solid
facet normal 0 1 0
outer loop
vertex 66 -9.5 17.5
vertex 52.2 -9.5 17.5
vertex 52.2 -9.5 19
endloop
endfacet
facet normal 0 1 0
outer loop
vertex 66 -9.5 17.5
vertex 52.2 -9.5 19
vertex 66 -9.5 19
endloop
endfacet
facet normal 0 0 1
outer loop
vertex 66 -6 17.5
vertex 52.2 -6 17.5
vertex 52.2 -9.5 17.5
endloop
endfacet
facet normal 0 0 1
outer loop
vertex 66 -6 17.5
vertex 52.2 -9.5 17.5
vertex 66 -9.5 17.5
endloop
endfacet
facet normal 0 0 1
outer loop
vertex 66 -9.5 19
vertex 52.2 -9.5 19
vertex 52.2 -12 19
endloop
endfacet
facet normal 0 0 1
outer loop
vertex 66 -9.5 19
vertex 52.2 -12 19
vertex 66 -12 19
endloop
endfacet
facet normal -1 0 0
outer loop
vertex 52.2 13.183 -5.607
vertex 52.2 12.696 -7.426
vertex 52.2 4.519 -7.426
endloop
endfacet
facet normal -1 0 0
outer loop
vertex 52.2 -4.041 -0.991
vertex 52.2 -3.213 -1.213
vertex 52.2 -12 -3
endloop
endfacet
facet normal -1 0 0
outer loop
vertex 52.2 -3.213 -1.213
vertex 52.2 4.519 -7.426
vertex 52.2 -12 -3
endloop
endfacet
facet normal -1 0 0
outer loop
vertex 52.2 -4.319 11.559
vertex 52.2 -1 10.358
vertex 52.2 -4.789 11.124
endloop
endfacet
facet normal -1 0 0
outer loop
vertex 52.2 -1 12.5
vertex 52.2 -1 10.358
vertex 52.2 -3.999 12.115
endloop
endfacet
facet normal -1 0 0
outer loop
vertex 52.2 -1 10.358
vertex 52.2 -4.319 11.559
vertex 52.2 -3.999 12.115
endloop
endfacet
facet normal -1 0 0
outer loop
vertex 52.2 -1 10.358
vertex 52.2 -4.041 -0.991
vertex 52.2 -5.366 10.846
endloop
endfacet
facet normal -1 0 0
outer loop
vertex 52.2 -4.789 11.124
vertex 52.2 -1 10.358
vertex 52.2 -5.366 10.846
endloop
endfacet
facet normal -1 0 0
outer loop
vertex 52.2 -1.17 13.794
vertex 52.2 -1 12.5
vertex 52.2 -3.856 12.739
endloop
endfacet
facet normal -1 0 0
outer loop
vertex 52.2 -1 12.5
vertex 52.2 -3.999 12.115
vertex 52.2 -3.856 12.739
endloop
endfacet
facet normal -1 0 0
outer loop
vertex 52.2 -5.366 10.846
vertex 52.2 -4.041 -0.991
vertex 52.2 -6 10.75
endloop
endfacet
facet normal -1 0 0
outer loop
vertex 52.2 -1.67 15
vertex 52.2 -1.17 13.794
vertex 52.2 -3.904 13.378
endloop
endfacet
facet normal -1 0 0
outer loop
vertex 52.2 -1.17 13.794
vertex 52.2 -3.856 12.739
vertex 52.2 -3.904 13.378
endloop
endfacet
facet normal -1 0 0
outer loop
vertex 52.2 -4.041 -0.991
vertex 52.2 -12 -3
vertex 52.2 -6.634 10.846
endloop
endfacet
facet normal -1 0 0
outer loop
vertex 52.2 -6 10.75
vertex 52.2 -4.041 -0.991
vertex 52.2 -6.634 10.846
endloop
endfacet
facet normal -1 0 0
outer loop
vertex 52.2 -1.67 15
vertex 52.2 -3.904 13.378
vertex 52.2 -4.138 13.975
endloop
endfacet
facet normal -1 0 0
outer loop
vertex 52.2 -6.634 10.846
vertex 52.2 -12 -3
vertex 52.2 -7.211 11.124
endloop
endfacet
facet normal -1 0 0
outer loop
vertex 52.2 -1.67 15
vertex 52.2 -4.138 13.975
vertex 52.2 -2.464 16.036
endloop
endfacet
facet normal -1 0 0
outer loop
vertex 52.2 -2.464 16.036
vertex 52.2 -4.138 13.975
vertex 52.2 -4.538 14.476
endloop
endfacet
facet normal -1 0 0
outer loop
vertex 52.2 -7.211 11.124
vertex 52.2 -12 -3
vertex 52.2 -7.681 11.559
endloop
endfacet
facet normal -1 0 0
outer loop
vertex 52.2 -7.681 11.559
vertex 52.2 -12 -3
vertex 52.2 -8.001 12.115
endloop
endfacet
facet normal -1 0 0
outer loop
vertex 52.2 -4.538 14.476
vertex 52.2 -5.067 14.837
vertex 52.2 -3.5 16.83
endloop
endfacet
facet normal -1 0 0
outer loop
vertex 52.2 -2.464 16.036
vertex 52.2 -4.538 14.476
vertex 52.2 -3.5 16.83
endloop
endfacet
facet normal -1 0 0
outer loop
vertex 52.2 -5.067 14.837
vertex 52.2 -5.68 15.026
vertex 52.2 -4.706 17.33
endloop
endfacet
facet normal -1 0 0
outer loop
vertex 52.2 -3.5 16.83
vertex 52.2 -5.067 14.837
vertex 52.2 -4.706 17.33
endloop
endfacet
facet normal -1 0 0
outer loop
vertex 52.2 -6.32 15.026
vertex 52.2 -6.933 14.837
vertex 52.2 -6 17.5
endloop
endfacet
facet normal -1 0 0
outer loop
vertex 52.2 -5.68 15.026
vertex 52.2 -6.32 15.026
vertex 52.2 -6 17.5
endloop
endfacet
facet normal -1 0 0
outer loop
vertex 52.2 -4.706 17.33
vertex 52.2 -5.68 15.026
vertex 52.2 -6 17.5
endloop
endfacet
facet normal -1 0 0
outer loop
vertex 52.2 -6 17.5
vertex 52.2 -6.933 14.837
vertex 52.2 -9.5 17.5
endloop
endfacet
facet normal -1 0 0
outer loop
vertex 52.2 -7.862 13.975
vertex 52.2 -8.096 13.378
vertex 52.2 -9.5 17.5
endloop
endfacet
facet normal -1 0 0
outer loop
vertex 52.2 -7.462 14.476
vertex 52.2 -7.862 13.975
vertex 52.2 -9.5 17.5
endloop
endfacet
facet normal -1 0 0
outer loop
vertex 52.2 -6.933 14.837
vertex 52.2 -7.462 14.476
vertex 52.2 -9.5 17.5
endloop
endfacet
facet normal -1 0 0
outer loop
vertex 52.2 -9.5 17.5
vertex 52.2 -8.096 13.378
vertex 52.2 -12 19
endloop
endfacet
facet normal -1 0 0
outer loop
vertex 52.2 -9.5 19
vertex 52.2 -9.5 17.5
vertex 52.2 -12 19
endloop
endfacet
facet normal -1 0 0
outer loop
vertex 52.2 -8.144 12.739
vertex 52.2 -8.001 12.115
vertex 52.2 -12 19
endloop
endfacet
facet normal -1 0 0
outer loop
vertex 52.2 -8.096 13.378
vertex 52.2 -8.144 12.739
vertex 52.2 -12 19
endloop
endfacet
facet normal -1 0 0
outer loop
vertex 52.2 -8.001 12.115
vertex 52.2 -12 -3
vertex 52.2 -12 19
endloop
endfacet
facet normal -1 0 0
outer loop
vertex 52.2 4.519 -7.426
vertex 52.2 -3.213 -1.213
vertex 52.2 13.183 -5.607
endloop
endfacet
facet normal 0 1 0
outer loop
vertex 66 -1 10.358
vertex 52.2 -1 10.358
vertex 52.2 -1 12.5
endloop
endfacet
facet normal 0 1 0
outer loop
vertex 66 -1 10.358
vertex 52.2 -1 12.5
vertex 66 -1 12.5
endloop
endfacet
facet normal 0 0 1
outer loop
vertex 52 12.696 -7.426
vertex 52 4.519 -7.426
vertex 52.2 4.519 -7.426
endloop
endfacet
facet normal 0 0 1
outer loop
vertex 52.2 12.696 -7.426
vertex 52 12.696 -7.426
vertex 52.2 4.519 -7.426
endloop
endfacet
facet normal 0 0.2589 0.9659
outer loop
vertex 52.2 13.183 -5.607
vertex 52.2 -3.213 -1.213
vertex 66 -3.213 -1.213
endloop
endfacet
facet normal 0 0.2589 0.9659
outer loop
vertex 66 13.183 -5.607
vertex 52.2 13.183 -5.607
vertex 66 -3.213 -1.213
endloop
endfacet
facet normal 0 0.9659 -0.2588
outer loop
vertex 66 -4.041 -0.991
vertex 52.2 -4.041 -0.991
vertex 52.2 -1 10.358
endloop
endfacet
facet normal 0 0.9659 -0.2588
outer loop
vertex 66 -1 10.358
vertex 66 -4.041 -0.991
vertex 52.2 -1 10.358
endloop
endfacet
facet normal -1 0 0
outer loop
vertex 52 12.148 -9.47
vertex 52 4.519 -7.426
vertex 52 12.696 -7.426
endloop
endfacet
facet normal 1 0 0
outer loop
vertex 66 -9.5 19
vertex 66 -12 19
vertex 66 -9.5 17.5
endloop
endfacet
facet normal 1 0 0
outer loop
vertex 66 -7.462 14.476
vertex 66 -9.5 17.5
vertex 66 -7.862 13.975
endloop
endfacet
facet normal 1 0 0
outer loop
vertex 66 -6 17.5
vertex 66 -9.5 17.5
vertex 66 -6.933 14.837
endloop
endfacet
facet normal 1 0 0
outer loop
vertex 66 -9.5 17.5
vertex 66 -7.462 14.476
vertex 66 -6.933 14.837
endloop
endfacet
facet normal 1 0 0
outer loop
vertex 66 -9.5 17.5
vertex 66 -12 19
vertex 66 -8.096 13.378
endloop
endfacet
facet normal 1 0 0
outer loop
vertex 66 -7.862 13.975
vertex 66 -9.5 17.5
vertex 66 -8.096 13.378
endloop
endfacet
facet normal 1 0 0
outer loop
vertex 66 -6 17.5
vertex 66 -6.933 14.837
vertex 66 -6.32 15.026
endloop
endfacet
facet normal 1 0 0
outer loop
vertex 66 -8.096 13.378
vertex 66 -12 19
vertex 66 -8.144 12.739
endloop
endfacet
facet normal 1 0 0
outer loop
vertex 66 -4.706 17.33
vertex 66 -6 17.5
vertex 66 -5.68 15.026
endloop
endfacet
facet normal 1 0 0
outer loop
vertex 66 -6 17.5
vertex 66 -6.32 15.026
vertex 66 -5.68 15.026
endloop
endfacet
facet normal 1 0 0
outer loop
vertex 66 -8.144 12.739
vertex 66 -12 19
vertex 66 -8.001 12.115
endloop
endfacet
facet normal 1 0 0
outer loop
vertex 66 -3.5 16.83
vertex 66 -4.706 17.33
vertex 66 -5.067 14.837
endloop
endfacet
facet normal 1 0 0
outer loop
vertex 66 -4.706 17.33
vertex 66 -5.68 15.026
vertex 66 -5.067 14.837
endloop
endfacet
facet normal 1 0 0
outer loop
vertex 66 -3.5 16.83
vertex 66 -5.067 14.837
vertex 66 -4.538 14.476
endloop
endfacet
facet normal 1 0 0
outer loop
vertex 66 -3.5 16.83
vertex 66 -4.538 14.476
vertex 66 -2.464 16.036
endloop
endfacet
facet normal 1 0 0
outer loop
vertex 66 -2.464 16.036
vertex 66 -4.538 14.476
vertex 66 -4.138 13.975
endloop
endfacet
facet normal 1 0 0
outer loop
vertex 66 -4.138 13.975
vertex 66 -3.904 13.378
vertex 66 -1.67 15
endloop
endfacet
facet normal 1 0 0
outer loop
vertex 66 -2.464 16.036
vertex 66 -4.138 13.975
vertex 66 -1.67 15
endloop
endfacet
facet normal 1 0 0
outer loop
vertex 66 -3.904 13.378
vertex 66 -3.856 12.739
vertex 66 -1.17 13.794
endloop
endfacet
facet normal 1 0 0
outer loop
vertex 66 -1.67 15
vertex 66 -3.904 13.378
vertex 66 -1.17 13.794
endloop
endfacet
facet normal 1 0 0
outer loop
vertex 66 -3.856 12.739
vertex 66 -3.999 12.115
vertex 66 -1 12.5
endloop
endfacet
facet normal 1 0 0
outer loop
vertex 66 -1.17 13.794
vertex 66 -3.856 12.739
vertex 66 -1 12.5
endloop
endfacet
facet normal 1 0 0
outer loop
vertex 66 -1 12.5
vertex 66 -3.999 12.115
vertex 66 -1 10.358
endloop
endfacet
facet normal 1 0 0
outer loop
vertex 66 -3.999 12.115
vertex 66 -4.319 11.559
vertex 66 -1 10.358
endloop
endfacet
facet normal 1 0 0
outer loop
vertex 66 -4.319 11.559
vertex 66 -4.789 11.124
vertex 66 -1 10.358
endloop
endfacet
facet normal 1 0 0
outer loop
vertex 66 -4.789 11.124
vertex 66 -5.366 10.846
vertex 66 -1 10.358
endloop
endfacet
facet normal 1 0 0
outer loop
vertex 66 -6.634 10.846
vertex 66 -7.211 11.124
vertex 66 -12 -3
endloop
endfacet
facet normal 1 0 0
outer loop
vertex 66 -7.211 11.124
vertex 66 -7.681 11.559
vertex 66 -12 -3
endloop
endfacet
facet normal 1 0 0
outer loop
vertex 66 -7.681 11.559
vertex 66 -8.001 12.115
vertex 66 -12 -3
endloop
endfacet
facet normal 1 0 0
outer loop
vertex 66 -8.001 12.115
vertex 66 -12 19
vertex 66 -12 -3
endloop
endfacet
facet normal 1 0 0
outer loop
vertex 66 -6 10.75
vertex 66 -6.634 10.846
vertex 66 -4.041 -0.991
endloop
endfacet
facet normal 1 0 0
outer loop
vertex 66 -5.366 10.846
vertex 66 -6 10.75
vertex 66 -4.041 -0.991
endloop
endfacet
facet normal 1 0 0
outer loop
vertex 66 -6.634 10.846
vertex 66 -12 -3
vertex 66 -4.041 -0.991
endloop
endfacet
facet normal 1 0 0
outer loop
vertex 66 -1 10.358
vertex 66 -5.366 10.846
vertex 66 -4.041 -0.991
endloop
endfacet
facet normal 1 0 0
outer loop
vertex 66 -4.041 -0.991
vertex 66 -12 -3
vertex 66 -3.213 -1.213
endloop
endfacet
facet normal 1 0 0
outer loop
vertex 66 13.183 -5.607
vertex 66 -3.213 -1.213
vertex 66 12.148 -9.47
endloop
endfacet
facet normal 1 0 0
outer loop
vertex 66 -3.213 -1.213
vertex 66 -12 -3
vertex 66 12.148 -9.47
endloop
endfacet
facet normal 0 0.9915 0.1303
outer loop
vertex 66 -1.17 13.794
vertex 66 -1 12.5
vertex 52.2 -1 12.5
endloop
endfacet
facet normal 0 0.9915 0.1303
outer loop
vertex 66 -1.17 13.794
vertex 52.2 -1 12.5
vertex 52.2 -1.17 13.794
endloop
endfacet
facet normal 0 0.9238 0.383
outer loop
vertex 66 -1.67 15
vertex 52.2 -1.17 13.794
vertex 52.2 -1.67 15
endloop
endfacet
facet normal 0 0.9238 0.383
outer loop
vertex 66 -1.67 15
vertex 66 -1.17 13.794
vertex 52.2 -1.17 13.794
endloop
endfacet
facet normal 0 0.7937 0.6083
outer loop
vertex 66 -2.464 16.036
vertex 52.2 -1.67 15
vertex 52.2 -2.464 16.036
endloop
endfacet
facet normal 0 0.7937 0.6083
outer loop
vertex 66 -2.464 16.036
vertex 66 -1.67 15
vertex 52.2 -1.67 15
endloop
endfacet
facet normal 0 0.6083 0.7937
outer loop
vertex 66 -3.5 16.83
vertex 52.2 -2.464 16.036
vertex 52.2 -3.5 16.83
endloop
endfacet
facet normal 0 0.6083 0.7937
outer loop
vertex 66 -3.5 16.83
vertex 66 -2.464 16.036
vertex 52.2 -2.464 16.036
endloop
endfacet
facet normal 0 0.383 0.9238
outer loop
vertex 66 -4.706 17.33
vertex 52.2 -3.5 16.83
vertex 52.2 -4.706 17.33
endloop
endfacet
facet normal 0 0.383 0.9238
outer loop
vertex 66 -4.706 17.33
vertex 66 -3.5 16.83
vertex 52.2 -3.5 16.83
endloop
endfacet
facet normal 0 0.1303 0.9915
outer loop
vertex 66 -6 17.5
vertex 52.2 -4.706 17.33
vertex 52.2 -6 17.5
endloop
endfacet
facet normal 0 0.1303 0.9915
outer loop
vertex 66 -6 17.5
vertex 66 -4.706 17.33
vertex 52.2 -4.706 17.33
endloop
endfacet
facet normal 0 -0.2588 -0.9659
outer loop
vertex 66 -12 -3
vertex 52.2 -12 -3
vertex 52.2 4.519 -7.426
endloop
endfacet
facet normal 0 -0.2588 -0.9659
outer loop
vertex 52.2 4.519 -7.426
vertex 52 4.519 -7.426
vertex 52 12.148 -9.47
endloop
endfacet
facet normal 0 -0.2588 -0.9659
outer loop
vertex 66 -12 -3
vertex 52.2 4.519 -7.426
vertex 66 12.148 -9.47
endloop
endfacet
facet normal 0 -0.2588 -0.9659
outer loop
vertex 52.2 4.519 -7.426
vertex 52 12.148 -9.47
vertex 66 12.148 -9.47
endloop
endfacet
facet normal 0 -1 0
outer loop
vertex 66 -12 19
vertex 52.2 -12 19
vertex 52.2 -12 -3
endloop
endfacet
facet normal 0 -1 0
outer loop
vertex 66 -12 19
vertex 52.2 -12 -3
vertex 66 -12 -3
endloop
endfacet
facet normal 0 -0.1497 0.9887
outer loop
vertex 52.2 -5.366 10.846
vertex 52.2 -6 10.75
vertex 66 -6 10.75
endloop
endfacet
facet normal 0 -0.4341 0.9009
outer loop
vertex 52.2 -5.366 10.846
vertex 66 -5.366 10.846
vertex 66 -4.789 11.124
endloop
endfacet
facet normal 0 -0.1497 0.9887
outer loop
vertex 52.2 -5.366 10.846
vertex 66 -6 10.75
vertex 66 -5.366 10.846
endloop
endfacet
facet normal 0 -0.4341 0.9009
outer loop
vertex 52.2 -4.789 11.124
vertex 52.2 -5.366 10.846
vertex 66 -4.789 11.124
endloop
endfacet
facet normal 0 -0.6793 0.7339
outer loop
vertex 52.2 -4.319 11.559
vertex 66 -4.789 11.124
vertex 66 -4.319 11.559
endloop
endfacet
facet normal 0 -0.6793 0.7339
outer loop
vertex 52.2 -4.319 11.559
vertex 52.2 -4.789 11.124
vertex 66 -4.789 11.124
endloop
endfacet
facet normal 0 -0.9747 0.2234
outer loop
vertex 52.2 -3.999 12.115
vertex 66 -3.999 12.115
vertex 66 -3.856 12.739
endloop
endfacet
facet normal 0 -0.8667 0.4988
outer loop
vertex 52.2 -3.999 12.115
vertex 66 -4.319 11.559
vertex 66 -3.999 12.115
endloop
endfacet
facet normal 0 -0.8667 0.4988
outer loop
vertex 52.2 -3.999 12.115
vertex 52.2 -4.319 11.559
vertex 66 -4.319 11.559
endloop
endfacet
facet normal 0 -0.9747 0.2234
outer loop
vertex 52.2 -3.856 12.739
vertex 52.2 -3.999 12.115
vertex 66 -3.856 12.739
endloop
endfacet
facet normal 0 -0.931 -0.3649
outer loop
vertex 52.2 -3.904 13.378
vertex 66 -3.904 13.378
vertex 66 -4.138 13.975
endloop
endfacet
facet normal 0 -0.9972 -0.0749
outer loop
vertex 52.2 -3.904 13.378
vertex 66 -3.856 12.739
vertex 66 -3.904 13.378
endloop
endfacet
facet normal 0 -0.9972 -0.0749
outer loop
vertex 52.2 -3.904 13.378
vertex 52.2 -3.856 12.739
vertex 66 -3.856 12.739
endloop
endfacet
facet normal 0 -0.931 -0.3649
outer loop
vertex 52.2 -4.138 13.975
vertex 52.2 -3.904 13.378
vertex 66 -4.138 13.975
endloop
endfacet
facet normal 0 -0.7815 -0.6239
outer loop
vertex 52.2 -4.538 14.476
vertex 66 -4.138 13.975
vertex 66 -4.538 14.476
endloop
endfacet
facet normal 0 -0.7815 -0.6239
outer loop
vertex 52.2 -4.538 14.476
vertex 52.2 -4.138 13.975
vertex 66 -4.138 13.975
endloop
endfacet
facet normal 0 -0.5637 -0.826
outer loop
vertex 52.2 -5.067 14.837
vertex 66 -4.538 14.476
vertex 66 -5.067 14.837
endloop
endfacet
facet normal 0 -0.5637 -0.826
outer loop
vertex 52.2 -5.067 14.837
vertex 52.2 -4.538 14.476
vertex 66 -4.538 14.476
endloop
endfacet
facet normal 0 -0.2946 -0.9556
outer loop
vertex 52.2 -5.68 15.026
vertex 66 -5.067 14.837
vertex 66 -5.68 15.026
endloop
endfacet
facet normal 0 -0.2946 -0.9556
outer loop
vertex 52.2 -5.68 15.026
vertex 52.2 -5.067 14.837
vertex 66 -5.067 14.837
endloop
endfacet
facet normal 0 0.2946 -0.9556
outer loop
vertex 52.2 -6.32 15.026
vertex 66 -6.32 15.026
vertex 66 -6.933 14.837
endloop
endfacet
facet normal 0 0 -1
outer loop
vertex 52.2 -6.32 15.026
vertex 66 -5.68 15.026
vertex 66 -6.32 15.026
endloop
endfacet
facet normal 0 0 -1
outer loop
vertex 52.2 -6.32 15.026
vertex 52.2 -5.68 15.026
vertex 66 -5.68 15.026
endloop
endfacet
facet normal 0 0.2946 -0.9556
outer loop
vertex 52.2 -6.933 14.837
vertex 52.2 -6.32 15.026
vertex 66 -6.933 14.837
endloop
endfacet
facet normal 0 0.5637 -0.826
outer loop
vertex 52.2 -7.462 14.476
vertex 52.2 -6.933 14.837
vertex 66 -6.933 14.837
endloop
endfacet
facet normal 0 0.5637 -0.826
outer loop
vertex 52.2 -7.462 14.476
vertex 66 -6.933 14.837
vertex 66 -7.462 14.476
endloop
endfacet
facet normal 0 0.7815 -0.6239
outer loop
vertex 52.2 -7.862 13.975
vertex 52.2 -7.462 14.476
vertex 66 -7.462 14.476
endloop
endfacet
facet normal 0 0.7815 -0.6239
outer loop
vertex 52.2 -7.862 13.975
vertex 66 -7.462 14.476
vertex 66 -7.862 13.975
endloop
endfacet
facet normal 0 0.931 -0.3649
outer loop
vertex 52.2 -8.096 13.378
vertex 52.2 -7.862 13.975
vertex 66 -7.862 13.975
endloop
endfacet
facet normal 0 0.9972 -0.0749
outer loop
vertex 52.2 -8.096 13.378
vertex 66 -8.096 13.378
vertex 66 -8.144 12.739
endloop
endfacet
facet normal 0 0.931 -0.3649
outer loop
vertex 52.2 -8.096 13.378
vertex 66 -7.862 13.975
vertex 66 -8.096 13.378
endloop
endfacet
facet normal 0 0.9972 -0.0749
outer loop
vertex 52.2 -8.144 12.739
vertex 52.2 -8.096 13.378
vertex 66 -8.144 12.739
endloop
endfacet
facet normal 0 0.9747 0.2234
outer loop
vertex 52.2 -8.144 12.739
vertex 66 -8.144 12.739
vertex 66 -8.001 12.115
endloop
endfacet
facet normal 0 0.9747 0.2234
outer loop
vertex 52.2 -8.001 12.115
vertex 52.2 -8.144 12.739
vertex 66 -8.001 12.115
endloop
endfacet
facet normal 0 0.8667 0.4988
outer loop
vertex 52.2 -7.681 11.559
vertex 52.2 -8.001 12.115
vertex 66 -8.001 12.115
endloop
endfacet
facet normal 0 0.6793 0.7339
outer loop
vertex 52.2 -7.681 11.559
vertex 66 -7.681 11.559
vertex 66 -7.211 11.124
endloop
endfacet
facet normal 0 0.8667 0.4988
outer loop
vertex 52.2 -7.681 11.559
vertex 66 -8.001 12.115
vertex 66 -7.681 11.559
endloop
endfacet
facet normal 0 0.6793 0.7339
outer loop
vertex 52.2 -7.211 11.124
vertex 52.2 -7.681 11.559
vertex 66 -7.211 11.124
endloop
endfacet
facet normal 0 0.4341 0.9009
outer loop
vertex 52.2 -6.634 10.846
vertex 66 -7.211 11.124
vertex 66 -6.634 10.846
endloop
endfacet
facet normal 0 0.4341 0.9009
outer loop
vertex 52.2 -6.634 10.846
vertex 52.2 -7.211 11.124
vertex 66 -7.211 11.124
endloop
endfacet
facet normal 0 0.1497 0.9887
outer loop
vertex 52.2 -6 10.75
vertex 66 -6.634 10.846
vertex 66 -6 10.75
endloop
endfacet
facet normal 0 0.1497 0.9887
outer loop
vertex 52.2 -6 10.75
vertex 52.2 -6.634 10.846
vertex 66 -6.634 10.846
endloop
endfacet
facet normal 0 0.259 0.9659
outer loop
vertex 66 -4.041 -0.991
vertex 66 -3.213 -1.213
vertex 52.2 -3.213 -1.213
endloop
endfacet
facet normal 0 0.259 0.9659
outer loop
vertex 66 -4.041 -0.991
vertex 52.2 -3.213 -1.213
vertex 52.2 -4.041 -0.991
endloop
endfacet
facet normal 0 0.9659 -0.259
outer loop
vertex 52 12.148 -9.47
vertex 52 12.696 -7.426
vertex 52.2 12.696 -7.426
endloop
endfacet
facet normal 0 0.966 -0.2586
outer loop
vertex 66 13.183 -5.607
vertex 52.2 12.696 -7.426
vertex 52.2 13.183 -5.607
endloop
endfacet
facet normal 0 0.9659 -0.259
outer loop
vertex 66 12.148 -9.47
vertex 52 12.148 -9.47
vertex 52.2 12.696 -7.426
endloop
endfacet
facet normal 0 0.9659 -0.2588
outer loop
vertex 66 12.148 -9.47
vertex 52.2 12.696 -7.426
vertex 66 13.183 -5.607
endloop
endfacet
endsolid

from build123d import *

# Parameters (mm, degrees)
CYLINDER_R           = 2.15
CYLINDER_DEPTH       = 50
CYLINDER_PITCH_ANGLE = 90
BOX002_W             = 14
BOX002_H             = 11
BOX002_DEPTH         = 20.5
CHAMFER_SIZE         = 4
FILLET001_R          = 5
BOX003_W             = 14
BOX003_H             = 25
BOX003_DEPTH         = 4
BOX003_ROLL_ANGLE    = -15
BOX004_W             = 14
BOX004_H             = 2.5
BOX004_DEPTH         = 5
POCKET006_DEPTH      = 15
SKETCH008_W          = 0.2
SKETCH008_H          = 34.34452
POCKET008_DEPTH      = 80


with BuildPart() as cylinder:
    # Cylinder → Cylinder (new body)
    with BuildSketch(Plane.XY):
        Circle(CYLINDER_R)
    extrude(amount=CYLINDER_DEPTH)


with BuildPart() as cylinder_1:
    # Cylinder pitch: moved
    add(cylinder.part.rotate(Axis((0, 0, 0), (0, 1, 0)), CYLINDER_PITCH_ANGLE))


with BuildPart() as cylinder_2:
    # Cylinder placement: moved
    add(cylinder_1.part.moved(Location((31, -6, 12.9))))


with BuildPart() as fillet001:
    # Box002 → Box002 (new body)
    with BuildSketch(Plane(origin=(52, -12, -3), x_dir=(1, 0, 0), z_dir=(0, 0, 1))):
        with Locations((7, 5.5)):
            Rectangle(BOX002_W, BOX002_H)
    extrude(amount=BOX002_DEPTH)

    # Chamfer
    chamfer_edges = [fillet001.edges().sort_by_distance(p)[0] for p in [
        (59, -1, -3),
    ]]
    chamfer(chamfer_edges, length=CHAMFER_SIZE)

    # Fillet001
    fillet001_edges = [fillet001.edges().sort_by_distance(p)[0] for p in [
        (59, -1, 17.5),
    ]]
    fillet(fillet001_edges, radius=FILLET001_R)


with BuildPart() as cube002:
    # Box003 → Box003 (new body)
    with BuildSketch(Plane.XY):
        with Locations((7, 12.5)):
            Rectangle(BOX003_W, BOX003_H)
    extrude(amount=BOX003_DEPTH)


with BuildPart() as cube002_1:
    # Box003 roll: moved
    add(cube002.part.rotate(Axis((0, 0, 0), (1, 0, 0)), BOX003_ROLL_ANGLE))


with BuildPart() as cube002_2:
    # Box003 placement: moved
    add(cube002_1.part.moved(Location((52, -12, -3))))


with BuildPart() as pocket008:
    # Box004 → Box004 (new body)
    with BuildSketch(Plane(origin=(52, -12, 14), x_dir=(1, 0, 0), z_dir=(0, 0, 1))):
        with Locations((7, 1.25)):
            Rectangle(BOX004_W, BOX004_H)
    extrude(amount=BOX004_DEPTH)

    # Fusion: union Fillet001, Cube002
    add(fillet001.part)
    add(cube002_2.part)

    # Cut001: cut Cylinder
    add(cylinder_2.part, mode=Mode.SUBTRACT)

    # Sketch006 → Pocket006 (cut)
    with BuildSketch(Plane.YZ.offset(66)):
        Polygon((13.183422, -5.606773), (-4.041064, -0.991486), (-0.407217, 12.570217), align=None)
    extrude(amount=-POCKET006_DEPTH, mode=Mode.SUBTRACT)

    # Sketch008 → Pocket008 (cut)
    with BuildSketch(Plane.XZ.offset(12)):
        with Locations((52.1, 9.746044)):
            Rectangle(SKETCH008_W, SKETCH008_H)
    extrude(amount=-POCKET008_DEPTH, mode=Mode.SUBTRACT)


solid = pocket008.part
